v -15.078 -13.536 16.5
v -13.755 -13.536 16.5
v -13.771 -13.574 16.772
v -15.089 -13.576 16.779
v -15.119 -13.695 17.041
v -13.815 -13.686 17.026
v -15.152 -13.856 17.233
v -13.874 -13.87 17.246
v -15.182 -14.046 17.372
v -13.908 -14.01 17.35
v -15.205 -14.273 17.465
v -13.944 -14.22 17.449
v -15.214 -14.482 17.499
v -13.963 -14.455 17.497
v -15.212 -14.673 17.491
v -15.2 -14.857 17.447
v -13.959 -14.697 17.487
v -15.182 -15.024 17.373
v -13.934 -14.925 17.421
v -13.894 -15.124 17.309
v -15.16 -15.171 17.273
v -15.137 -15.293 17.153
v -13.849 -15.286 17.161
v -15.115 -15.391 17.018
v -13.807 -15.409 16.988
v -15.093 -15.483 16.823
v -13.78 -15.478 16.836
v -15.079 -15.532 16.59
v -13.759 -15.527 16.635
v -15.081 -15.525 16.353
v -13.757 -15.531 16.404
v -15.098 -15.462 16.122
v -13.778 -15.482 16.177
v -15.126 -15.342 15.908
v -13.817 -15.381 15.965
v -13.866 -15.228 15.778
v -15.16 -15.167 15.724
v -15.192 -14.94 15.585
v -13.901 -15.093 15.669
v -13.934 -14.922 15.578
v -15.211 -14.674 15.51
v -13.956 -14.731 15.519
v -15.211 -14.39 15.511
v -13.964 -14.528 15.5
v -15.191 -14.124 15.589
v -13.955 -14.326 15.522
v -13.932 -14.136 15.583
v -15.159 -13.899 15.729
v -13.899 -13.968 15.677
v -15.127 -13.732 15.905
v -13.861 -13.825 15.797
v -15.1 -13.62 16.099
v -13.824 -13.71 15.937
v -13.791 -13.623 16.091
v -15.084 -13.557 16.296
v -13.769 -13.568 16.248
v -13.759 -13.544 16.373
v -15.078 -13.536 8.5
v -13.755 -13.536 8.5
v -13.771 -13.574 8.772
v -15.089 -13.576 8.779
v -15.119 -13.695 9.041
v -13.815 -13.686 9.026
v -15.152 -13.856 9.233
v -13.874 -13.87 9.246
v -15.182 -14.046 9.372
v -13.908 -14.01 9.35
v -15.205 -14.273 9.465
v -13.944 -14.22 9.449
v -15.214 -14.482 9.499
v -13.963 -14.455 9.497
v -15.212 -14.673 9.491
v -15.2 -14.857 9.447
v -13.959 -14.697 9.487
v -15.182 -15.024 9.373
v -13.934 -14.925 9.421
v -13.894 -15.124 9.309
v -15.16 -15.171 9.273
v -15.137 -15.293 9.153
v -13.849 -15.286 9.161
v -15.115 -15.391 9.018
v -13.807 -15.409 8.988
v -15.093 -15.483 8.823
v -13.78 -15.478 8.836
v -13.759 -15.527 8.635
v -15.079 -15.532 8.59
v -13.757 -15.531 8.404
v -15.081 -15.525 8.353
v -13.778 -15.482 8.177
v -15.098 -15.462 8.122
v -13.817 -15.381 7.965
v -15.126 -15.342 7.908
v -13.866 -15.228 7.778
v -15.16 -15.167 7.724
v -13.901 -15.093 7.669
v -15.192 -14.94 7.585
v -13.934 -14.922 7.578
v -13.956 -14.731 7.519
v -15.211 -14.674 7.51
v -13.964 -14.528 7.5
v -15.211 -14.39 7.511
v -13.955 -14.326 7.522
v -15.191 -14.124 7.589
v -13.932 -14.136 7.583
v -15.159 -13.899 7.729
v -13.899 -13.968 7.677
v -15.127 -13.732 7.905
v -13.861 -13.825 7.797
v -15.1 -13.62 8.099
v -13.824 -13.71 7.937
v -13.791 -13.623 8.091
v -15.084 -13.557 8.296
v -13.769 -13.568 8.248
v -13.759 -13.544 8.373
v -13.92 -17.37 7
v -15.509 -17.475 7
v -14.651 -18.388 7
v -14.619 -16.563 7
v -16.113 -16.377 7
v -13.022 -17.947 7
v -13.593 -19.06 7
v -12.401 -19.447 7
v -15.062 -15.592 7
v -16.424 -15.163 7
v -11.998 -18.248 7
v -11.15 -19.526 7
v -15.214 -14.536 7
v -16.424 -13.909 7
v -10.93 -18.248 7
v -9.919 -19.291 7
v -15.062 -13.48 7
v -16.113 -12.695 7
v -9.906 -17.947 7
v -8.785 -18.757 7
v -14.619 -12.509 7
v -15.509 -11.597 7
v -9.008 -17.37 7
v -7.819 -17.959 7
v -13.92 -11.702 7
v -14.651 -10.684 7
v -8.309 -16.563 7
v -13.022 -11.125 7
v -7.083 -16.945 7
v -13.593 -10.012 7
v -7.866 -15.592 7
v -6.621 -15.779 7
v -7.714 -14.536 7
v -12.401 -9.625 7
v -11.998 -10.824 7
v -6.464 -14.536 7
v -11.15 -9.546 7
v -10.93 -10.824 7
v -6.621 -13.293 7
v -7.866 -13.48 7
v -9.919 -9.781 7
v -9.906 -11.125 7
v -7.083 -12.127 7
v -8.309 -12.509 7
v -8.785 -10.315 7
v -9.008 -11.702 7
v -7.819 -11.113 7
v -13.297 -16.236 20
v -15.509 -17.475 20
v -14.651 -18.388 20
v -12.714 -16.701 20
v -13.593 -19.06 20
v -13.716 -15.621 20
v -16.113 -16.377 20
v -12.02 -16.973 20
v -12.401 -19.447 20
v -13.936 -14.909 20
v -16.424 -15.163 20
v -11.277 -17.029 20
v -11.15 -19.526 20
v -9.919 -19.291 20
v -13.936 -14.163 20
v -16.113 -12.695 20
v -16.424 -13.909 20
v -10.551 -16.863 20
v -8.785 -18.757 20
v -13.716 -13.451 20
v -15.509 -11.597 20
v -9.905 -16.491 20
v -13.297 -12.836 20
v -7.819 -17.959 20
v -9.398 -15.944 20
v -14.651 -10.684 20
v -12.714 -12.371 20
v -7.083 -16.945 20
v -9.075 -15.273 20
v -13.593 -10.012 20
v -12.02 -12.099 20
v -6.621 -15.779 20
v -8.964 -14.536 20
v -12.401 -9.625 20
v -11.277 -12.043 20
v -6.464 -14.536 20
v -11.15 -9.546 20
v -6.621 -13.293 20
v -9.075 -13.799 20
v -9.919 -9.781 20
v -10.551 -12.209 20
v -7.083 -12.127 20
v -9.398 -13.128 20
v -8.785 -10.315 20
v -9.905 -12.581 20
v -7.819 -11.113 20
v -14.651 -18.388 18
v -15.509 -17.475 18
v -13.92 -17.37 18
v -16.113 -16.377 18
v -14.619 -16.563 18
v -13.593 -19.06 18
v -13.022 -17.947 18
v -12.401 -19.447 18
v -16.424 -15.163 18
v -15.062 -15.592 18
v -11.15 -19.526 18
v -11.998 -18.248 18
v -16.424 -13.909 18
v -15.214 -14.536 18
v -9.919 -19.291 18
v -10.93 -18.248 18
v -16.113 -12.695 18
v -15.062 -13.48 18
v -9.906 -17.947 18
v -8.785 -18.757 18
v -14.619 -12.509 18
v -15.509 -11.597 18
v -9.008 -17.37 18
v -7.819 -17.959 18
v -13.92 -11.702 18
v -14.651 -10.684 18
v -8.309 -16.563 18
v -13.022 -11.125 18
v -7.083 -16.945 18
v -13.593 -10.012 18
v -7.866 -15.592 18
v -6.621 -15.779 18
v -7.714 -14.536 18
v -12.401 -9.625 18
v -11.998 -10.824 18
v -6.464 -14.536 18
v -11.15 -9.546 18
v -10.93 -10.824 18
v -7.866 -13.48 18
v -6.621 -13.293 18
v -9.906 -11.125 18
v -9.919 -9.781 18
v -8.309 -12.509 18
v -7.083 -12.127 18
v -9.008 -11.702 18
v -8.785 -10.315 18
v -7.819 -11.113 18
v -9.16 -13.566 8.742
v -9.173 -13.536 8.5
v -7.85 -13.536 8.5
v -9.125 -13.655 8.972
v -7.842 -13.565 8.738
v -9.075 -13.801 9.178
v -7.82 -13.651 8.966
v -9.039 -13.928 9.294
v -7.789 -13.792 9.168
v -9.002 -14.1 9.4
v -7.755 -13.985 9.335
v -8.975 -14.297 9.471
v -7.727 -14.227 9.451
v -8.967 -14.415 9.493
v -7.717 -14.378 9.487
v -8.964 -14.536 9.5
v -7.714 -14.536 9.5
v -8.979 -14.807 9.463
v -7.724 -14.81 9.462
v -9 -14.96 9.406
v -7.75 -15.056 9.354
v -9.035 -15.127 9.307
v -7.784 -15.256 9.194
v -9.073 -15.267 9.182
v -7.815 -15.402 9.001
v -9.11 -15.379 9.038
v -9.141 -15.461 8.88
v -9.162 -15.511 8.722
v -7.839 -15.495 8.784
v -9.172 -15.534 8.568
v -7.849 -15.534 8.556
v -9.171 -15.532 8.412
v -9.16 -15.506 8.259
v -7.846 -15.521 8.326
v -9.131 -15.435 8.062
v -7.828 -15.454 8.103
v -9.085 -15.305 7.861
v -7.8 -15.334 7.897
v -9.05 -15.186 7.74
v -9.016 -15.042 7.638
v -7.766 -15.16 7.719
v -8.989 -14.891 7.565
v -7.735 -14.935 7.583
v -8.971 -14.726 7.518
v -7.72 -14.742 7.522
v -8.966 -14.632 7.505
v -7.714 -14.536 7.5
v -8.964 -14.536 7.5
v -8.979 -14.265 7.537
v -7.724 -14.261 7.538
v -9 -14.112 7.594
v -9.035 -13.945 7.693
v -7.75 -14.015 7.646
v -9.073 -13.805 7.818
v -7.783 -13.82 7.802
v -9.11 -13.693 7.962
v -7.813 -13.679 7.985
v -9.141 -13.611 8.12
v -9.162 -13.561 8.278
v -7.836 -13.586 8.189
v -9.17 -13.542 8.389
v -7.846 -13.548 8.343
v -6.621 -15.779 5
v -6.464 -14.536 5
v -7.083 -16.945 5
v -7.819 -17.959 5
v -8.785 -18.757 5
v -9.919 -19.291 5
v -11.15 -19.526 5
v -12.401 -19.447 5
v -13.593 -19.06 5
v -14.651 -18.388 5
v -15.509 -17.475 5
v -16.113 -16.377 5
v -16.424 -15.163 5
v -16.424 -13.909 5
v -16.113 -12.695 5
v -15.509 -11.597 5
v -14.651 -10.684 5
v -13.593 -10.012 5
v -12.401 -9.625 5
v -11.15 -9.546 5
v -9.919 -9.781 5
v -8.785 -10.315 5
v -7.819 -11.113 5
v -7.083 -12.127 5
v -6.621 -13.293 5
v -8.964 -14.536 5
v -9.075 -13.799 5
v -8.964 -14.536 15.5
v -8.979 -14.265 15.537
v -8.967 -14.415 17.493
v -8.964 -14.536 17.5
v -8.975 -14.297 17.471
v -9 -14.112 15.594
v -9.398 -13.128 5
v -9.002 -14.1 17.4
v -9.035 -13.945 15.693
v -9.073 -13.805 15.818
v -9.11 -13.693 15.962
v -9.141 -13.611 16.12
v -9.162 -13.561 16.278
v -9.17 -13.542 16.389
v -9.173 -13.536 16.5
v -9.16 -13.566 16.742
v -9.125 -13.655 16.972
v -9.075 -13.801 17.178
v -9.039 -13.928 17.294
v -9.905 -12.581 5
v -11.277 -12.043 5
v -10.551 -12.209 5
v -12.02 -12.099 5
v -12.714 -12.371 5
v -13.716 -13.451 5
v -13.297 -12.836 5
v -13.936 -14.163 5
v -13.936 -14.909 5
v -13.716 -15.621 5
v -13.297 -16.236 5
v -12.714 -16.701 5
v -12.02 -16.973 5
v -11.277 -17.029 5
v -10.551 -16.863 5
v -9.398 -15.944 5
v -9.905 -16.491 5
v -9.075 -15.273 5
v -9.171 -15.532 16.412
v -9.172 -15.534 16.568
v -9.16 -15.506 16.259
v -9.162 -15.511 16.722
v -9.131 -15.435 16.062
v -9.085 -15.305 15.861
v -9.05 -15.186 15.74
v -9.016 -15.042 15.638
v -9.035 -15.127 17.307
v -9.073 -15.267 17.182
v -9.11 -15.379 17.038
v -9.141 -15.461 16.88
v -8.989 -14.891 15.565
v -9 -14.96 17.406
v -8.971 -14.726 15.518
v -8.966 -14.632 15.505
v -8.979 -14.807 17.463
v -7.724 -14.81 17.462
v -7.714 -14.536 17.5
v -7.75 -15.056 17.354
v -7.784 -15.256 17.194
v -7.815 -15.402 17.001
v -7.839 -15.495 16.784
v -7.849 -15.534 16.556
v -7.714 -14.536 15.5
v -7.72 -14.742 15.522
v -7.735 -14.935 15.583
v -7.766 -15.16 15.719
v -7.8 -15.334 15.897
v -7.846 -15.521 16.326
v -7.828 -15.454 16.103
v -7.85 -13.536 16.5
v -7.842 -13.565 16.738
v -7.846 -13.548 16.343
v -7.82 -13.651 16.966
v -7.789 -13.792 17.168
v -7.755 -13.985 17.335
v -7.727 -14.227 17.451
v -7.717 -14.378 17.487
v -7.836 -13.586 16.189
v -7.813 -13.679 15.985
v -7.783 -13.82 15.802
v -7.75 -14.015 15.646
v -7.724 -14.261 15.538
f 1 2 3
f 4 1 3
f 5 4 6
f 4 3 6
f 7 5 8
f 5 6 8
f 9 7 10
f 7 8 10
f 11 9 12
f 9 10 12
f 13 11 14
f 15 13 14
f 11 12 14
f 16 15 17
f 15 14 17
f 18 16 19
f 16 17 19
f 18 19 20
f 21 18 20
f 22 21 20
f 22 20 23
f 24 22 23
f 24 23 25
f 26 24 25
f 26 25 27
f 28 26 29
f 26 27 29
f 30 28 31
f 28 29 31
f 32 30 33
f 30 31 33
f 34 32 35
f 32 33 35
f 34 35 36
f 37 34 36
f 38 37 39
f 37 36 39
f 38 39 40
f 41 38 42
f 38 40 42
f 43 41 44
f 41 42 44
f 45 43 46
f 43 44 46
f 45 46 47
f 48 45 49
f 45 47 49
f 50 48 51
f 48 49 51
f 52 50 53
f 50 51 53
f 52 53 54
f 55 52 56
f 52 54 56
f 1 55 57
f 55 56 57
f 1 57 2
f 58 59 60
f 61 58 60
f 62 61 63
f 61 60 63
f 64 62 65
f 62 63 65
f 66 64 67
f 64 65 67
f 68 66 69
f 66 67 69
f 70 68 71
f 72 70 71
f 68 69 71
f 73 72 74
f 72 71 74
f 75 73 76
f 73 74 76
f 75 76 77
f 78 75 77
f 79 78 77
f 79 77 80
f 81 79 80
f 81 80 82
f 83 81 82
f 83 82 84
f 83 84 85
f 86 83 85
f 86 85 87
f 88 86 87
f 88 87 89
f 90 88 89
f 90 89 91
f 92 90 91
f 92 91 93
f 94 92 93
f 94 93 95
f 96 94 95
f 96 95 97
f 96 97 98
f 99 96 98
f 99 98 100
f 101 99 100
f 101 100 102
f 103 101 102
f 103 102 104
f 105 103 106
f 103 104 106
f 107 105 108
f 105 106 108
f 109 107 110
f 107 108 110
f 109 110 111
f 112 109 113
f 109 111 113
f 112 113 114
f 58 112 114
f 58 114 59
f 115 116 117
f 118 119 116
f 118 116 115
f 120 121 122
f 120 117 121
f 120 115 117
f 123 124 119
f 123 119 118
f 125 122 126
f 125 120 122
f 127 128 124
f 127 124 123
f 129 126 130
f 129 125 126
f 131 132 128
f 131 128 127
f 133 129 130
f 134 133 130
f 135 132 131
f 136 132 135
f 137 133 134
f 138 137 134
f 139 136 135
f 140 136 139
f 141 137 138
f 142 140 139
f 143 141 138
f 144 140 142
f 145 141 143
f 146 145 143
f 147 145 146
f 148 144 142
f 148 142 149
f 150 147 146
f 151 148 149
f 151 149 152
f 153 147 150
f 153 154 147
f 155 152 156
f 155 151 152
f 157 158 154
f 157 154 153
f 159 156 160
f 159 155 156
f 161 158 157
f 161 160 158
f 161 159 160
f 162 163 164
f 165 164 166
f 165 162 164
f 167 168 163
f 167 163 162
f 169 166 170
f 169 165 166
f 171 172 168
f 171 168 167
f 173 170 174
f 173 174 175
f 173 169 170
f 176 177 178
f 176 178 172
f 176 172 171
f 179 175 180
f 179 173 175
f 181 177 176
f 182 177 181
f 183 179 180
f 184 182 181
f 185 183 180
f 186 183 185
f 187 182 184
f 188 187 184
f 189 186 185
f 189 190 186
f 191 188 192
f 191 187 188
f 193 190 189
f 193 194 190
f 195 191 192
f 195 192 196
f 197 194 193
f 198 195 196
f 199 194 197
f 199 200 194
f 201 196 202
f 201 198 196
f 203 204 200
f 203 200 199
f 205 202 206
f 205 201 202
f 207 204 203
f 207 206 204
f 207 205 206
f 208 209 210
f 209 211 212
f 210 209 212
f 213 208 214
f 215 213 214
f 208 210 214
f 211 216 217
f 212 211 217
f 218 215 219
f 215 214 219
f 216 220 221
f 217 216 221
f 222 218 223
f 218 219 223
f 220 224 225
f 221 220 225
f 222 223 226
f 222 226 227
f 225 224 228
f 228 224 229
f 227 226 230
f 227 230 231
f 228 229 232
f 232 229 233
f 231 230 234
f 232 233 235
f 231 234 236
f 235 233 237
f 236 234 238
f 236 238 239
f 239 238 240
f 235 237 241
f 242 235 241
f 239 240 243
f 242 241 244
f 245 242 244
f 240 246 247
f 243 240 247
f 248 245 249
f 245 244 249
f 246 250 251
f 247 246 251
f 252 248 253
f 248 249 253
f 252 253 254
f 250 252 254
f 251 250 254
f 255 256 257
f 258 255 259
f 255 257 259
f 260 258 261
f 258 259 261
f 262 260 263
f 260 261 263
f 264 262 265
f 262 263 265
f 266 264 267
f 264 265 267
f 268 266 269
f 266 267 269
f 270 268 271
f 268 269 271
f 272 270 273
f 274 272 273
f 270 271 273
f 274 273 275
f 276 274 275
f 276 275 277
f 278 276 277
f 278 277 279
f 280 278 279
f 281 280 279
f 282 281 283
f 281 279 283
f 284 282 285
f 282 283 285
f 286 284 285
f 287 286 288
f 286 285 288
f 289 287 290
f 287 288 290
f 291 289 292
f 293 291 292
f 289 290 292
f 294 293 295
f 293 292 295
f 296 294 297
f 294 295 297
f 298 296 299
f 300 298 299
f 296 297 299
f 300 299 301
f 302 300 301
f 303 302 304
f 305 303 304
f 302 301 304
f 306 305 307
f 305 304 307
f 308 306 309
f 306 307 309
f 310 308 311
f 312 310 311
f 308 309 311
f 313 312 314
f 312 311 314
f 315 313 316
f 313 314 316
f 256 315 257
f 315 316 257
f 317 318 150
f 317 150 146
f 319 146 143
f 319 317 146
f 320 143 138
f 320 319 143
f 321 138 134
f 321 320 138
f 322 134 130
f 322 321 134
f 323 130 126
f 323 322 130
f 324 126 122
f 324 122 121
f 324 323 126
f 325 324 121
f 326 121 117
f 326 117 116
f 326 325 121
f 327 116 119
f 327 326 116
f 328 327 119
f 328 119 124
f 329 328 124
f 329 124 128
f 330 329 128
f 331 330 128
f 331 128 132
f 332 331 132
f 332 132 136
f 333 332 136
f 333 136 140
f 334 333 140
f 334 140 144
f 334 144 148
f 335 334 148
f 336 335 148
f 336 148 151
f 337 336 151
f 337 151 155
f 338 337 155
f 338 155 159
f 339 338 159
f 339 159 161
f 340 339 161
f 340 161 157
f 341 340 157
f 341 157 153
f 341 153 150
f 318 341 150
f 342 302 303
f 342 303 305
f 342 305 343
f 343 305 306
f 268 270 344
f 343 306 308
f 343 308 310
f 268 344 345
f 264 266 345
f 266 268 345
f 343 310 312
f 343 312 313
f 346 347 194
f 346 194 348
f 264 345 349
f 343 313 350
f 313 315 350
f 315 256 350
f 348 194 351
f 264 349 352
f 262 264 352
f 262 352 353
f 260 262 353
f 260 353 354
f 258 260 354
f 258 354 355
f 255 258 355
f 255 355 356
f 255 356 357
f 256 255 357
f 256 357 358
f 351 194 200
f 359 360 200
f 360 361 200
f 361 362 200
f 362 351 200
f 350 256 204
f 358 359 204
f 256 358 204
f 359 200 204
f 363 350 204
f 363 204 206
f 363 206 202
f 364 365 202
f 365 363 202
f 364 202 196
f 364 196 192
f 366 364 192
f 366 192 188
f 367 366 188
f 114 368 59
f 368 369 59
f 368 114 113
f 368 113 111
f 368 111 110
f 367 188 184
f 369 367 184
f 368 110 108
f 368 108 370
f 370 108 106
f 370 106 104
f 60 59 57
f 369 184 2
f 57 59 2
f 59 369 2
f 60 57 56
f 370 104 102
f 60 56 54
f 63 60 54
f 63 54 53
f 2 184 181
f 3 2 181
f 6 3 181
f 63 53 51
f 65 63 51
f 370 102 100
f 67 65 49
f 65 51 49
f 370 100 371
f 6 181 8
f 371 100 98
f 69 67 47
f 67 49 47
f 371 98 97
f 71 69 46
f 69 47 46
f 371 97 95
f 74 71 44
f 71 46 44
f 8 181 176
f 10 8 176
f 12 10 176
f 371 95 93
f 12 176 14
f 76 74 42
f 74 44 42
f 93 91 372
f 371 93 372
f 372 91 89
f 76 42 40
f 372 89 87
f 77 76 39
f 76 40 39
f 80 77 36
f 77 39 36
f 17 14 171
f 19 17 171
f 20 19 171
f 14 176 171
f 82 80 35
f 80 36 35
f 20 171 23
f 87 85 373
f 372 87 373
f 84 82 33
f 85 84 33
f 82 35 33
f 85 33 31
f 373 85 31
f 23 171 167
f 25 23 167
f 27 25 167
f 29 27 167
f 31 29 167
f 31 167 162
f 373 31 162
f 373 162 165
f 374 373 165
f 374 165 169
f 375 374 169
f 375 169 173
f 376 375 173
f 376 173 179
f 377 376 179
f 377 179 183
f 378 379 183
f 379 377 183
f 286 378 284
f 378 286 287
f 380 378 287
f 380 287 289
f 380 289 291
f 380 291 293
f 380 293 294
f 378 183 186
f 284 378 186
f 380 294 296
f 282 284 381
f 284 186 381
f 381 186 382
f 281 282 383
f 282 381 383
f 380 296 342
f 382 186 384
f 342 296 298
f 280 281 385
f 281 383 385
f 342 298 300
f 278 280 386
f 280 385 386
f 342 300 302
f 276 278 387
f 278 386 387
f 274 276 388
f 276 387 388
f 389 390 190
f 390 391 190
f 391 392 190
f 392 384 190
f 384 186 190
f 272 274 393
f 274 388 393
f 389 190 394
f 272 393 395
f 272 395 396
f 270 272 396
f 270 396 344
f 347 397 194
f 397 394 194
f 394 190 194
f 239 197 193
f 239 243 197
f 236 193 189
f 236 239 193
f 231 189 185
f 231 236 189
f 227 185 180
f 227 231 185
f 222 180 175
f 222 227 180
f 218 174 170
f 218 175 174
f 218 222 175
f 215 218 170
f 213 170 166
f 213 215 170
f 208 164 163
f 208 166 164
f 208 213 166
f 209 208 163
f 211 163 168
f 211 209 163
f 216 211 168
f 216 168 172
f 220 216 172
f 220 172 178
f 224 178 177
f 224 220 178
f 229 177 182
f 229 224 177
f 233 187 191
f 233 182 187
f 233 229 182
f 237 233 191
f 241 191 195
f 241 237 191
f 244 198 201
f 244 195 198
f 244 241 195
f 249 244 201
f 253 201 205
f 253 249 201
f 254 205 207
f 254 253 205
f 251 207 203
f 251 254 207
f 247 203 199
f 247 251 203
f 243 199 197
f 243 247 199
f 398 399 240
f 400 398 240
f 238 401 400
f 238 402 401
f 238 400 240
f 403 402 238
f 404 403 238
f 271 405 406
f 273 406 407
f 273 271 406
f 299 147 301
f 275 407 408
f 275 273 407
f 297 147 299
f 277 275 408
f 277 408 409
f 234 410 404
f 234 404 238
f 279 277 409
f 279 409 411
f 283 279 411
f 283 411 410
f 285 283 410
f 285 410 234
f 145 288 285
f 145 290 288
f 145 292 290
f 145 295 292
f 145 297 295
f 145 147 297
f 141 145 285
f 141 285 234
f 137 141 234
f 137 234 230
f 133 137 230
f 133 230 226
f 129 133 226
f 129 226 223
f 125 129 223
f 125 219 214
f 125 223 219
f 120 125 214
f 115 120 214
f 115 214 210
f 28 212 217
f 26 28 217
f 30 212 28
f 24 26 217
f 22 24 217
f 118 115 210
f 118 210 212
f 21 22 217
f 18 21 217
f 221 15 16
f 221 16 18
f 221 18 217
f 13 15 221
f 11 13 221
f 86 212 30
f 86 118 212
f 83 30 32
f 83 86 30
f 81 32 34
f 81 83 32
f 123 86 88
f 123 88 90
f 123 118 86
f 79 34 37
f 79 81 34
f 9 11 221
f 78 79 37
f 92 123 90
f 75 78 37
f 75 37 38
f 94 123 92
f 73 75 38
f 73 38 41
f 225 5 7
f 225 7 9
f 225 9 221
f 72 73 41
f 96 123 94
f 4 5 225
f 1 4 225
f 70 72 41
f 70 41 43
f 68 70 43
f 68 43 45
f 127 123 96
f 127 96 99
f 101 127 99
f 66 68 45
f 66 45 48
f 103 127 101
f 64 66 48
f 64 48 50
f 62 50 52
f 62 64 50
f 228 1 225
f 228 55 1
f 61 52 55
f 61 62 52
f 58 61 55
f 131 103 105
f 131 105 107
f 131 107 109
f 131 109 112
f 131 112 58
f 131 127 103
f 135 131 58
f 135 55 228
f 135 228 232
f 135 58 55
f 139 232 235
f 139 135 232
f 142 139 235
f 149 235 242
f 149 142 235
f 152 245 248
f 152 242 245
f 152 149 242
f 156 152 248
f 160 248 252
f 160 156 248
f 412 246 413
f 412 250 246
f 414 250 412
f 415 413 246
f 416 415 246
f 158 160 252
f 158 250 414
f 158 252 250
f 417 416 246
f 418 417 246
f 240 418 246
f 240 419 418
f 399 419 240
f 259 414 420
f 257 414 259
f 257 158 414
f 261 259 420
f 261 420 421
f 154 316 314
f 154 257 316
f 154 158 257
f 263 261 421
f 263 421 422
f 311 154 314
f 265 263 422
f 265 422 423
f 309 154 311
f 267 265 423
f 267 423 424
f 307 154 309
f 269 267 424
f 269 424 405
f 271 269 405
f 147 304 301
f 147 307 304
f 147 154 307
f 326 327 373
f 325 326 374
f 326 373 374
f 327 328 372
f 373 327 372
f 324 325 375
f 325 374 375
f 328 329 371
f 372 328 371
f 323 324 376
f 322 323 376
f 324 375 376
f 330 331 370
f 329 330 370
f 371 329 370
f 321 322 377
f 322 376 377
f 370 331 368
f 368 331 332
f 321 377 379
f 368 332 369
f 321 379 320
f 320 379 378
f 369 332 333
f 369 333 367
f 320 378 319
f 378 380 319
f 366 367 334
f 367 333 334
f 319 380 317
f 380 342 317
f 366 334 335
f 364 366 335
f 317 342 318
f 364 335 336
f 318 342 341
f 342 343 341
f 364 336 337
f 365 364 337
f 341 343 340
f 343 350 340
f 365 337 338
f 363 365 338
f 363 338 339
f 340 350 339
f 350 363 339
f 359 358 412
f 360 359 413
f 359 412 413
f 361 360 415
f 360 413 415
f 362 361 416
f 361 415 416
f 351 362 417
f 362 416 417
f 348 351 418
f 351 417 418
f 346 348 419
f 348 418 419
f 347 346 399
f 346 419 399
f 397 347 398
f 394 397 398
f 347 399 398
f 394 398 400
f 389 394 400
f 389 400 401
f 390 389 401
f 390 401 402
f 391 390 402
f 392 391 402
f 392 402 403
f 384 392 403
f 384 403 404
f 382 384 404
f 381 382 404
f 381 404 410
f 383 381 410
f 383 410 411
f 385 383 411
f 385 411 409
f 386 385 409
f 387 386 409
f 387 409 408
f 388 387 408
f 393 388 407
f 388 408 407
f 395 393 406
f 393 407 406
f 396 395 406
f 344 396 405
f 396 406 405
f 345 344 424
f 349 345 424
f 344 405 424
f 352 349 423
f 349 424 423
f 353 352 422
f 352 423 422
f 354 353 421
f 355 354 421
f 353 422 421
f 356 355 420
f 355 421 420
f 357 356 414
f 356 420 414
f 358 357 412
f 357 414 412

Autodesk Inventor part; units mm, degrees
ref_plane "YZ Plane" through (0, 0, 0) normal (1, 0, 0) x (0, 1, 0)
ref_plane "XZ Plane" through (0, 0, 0) normal (0, 1, 0) x (-1, 0, 0)
ref_plane "XY Plane" through (0, 0, 0) normal (0, 0, 1) x (1, 0, 0)
sketch "Boceto1" plane through (-15.751, -17.109, 5) normal (0, 0, 1) x (1, 0, 0)
  line L0 (0, 0) -> (8.574, 5.146)
  circle A0 centre (4.287, 2.573) radius 4.9998
  point P0 (15.751, 17.109)
extrude "Extrusión1" add sketch "Boceto1" along normal blind 2
sketch "Boceto2" plane through (-11.464, -14.536, 7) normal (0, 0, 1) x (1, 0, 0)
  circle A0 centre (0, 0) radius 3.75
  point P0 (11.464, 14.536)
  dimension "d2" = 7.5
extrude "Extrusión2" add sketch "Boceto2" along normal blind 11
sketch "Boceto3" plane through (-11.464, -14.536, 18) normal (0, 0, 1) x (1, 0, 0)
  circle A0 centre (0, 0) radius 4.9998
  point P0 (11.464, 14.536)
extrude "Extrusión3" add sketch "Boceto3" along normal blind 2
sketch "Boceto4" plane through (-11.464, -14.536, 20) normal (0, 0, 1) x (1, 0, 0)
  circle A0 centre (0, 0) radius 2.5
  point P0 (11.464, 14.536)
  dimension "d7" = 5
extrude "Extrusión4" cut sketch "Boceto4" against normal blind 22
sketch "Boceto5" plane through (0, 0, 0) normal (1, 0, 0) x (0, 1, 0)
  line L0 (-18.286, 7) -> (-10.786, 7) projected
  line L1 (-14.536, 7) -> (-14.536, 8.5)
  line L2 (-14.536, 8.5) -> (-14.536, 18)
  line L3 (-10.786, 18) -> (-18.286, 18) projected
  line L4 (-14.536, 18) -> (-14.536, 16.5)
  circle A0 centre (-14.536, 16.5) radius 1
  circle A1 centre (-14.536, 8.5) radius 1
  point P0 (0, 0)
  dimension "d10" = 1.5
  dimension "d11" = 1.5
  dimension "d12" = 2
  dimension "d13" = 2
extrude "Extrusión5" cut sketch "Boceto5" against normal blind 22
sketch "Boceto7" plane through (-15.751, -17.109, 5) normal (0, 0, 1) x (1, 0, 0)
  circle A0 centre (4.287, 2.573) radius 2.5 projected
  circle A1 centre (4.287, 2.573) radius 2.5
  point P0 (15.751, 17.109)
extrude "Extrusión6" add sketch "Boceto7" against normal blind 5
sketch "Boceto8" plane through (-11.464, -14.536, 0) normal (0, 0, -1) x (-1, 0, 0)
  circle A0 centre (0, 0) radius 2.5
  point P0 (-11.464, 14.536)
extrude "Extrusión7" cut sketch "Boceto8" against normal blind 5
properties part number "eng_chic_2_1"
